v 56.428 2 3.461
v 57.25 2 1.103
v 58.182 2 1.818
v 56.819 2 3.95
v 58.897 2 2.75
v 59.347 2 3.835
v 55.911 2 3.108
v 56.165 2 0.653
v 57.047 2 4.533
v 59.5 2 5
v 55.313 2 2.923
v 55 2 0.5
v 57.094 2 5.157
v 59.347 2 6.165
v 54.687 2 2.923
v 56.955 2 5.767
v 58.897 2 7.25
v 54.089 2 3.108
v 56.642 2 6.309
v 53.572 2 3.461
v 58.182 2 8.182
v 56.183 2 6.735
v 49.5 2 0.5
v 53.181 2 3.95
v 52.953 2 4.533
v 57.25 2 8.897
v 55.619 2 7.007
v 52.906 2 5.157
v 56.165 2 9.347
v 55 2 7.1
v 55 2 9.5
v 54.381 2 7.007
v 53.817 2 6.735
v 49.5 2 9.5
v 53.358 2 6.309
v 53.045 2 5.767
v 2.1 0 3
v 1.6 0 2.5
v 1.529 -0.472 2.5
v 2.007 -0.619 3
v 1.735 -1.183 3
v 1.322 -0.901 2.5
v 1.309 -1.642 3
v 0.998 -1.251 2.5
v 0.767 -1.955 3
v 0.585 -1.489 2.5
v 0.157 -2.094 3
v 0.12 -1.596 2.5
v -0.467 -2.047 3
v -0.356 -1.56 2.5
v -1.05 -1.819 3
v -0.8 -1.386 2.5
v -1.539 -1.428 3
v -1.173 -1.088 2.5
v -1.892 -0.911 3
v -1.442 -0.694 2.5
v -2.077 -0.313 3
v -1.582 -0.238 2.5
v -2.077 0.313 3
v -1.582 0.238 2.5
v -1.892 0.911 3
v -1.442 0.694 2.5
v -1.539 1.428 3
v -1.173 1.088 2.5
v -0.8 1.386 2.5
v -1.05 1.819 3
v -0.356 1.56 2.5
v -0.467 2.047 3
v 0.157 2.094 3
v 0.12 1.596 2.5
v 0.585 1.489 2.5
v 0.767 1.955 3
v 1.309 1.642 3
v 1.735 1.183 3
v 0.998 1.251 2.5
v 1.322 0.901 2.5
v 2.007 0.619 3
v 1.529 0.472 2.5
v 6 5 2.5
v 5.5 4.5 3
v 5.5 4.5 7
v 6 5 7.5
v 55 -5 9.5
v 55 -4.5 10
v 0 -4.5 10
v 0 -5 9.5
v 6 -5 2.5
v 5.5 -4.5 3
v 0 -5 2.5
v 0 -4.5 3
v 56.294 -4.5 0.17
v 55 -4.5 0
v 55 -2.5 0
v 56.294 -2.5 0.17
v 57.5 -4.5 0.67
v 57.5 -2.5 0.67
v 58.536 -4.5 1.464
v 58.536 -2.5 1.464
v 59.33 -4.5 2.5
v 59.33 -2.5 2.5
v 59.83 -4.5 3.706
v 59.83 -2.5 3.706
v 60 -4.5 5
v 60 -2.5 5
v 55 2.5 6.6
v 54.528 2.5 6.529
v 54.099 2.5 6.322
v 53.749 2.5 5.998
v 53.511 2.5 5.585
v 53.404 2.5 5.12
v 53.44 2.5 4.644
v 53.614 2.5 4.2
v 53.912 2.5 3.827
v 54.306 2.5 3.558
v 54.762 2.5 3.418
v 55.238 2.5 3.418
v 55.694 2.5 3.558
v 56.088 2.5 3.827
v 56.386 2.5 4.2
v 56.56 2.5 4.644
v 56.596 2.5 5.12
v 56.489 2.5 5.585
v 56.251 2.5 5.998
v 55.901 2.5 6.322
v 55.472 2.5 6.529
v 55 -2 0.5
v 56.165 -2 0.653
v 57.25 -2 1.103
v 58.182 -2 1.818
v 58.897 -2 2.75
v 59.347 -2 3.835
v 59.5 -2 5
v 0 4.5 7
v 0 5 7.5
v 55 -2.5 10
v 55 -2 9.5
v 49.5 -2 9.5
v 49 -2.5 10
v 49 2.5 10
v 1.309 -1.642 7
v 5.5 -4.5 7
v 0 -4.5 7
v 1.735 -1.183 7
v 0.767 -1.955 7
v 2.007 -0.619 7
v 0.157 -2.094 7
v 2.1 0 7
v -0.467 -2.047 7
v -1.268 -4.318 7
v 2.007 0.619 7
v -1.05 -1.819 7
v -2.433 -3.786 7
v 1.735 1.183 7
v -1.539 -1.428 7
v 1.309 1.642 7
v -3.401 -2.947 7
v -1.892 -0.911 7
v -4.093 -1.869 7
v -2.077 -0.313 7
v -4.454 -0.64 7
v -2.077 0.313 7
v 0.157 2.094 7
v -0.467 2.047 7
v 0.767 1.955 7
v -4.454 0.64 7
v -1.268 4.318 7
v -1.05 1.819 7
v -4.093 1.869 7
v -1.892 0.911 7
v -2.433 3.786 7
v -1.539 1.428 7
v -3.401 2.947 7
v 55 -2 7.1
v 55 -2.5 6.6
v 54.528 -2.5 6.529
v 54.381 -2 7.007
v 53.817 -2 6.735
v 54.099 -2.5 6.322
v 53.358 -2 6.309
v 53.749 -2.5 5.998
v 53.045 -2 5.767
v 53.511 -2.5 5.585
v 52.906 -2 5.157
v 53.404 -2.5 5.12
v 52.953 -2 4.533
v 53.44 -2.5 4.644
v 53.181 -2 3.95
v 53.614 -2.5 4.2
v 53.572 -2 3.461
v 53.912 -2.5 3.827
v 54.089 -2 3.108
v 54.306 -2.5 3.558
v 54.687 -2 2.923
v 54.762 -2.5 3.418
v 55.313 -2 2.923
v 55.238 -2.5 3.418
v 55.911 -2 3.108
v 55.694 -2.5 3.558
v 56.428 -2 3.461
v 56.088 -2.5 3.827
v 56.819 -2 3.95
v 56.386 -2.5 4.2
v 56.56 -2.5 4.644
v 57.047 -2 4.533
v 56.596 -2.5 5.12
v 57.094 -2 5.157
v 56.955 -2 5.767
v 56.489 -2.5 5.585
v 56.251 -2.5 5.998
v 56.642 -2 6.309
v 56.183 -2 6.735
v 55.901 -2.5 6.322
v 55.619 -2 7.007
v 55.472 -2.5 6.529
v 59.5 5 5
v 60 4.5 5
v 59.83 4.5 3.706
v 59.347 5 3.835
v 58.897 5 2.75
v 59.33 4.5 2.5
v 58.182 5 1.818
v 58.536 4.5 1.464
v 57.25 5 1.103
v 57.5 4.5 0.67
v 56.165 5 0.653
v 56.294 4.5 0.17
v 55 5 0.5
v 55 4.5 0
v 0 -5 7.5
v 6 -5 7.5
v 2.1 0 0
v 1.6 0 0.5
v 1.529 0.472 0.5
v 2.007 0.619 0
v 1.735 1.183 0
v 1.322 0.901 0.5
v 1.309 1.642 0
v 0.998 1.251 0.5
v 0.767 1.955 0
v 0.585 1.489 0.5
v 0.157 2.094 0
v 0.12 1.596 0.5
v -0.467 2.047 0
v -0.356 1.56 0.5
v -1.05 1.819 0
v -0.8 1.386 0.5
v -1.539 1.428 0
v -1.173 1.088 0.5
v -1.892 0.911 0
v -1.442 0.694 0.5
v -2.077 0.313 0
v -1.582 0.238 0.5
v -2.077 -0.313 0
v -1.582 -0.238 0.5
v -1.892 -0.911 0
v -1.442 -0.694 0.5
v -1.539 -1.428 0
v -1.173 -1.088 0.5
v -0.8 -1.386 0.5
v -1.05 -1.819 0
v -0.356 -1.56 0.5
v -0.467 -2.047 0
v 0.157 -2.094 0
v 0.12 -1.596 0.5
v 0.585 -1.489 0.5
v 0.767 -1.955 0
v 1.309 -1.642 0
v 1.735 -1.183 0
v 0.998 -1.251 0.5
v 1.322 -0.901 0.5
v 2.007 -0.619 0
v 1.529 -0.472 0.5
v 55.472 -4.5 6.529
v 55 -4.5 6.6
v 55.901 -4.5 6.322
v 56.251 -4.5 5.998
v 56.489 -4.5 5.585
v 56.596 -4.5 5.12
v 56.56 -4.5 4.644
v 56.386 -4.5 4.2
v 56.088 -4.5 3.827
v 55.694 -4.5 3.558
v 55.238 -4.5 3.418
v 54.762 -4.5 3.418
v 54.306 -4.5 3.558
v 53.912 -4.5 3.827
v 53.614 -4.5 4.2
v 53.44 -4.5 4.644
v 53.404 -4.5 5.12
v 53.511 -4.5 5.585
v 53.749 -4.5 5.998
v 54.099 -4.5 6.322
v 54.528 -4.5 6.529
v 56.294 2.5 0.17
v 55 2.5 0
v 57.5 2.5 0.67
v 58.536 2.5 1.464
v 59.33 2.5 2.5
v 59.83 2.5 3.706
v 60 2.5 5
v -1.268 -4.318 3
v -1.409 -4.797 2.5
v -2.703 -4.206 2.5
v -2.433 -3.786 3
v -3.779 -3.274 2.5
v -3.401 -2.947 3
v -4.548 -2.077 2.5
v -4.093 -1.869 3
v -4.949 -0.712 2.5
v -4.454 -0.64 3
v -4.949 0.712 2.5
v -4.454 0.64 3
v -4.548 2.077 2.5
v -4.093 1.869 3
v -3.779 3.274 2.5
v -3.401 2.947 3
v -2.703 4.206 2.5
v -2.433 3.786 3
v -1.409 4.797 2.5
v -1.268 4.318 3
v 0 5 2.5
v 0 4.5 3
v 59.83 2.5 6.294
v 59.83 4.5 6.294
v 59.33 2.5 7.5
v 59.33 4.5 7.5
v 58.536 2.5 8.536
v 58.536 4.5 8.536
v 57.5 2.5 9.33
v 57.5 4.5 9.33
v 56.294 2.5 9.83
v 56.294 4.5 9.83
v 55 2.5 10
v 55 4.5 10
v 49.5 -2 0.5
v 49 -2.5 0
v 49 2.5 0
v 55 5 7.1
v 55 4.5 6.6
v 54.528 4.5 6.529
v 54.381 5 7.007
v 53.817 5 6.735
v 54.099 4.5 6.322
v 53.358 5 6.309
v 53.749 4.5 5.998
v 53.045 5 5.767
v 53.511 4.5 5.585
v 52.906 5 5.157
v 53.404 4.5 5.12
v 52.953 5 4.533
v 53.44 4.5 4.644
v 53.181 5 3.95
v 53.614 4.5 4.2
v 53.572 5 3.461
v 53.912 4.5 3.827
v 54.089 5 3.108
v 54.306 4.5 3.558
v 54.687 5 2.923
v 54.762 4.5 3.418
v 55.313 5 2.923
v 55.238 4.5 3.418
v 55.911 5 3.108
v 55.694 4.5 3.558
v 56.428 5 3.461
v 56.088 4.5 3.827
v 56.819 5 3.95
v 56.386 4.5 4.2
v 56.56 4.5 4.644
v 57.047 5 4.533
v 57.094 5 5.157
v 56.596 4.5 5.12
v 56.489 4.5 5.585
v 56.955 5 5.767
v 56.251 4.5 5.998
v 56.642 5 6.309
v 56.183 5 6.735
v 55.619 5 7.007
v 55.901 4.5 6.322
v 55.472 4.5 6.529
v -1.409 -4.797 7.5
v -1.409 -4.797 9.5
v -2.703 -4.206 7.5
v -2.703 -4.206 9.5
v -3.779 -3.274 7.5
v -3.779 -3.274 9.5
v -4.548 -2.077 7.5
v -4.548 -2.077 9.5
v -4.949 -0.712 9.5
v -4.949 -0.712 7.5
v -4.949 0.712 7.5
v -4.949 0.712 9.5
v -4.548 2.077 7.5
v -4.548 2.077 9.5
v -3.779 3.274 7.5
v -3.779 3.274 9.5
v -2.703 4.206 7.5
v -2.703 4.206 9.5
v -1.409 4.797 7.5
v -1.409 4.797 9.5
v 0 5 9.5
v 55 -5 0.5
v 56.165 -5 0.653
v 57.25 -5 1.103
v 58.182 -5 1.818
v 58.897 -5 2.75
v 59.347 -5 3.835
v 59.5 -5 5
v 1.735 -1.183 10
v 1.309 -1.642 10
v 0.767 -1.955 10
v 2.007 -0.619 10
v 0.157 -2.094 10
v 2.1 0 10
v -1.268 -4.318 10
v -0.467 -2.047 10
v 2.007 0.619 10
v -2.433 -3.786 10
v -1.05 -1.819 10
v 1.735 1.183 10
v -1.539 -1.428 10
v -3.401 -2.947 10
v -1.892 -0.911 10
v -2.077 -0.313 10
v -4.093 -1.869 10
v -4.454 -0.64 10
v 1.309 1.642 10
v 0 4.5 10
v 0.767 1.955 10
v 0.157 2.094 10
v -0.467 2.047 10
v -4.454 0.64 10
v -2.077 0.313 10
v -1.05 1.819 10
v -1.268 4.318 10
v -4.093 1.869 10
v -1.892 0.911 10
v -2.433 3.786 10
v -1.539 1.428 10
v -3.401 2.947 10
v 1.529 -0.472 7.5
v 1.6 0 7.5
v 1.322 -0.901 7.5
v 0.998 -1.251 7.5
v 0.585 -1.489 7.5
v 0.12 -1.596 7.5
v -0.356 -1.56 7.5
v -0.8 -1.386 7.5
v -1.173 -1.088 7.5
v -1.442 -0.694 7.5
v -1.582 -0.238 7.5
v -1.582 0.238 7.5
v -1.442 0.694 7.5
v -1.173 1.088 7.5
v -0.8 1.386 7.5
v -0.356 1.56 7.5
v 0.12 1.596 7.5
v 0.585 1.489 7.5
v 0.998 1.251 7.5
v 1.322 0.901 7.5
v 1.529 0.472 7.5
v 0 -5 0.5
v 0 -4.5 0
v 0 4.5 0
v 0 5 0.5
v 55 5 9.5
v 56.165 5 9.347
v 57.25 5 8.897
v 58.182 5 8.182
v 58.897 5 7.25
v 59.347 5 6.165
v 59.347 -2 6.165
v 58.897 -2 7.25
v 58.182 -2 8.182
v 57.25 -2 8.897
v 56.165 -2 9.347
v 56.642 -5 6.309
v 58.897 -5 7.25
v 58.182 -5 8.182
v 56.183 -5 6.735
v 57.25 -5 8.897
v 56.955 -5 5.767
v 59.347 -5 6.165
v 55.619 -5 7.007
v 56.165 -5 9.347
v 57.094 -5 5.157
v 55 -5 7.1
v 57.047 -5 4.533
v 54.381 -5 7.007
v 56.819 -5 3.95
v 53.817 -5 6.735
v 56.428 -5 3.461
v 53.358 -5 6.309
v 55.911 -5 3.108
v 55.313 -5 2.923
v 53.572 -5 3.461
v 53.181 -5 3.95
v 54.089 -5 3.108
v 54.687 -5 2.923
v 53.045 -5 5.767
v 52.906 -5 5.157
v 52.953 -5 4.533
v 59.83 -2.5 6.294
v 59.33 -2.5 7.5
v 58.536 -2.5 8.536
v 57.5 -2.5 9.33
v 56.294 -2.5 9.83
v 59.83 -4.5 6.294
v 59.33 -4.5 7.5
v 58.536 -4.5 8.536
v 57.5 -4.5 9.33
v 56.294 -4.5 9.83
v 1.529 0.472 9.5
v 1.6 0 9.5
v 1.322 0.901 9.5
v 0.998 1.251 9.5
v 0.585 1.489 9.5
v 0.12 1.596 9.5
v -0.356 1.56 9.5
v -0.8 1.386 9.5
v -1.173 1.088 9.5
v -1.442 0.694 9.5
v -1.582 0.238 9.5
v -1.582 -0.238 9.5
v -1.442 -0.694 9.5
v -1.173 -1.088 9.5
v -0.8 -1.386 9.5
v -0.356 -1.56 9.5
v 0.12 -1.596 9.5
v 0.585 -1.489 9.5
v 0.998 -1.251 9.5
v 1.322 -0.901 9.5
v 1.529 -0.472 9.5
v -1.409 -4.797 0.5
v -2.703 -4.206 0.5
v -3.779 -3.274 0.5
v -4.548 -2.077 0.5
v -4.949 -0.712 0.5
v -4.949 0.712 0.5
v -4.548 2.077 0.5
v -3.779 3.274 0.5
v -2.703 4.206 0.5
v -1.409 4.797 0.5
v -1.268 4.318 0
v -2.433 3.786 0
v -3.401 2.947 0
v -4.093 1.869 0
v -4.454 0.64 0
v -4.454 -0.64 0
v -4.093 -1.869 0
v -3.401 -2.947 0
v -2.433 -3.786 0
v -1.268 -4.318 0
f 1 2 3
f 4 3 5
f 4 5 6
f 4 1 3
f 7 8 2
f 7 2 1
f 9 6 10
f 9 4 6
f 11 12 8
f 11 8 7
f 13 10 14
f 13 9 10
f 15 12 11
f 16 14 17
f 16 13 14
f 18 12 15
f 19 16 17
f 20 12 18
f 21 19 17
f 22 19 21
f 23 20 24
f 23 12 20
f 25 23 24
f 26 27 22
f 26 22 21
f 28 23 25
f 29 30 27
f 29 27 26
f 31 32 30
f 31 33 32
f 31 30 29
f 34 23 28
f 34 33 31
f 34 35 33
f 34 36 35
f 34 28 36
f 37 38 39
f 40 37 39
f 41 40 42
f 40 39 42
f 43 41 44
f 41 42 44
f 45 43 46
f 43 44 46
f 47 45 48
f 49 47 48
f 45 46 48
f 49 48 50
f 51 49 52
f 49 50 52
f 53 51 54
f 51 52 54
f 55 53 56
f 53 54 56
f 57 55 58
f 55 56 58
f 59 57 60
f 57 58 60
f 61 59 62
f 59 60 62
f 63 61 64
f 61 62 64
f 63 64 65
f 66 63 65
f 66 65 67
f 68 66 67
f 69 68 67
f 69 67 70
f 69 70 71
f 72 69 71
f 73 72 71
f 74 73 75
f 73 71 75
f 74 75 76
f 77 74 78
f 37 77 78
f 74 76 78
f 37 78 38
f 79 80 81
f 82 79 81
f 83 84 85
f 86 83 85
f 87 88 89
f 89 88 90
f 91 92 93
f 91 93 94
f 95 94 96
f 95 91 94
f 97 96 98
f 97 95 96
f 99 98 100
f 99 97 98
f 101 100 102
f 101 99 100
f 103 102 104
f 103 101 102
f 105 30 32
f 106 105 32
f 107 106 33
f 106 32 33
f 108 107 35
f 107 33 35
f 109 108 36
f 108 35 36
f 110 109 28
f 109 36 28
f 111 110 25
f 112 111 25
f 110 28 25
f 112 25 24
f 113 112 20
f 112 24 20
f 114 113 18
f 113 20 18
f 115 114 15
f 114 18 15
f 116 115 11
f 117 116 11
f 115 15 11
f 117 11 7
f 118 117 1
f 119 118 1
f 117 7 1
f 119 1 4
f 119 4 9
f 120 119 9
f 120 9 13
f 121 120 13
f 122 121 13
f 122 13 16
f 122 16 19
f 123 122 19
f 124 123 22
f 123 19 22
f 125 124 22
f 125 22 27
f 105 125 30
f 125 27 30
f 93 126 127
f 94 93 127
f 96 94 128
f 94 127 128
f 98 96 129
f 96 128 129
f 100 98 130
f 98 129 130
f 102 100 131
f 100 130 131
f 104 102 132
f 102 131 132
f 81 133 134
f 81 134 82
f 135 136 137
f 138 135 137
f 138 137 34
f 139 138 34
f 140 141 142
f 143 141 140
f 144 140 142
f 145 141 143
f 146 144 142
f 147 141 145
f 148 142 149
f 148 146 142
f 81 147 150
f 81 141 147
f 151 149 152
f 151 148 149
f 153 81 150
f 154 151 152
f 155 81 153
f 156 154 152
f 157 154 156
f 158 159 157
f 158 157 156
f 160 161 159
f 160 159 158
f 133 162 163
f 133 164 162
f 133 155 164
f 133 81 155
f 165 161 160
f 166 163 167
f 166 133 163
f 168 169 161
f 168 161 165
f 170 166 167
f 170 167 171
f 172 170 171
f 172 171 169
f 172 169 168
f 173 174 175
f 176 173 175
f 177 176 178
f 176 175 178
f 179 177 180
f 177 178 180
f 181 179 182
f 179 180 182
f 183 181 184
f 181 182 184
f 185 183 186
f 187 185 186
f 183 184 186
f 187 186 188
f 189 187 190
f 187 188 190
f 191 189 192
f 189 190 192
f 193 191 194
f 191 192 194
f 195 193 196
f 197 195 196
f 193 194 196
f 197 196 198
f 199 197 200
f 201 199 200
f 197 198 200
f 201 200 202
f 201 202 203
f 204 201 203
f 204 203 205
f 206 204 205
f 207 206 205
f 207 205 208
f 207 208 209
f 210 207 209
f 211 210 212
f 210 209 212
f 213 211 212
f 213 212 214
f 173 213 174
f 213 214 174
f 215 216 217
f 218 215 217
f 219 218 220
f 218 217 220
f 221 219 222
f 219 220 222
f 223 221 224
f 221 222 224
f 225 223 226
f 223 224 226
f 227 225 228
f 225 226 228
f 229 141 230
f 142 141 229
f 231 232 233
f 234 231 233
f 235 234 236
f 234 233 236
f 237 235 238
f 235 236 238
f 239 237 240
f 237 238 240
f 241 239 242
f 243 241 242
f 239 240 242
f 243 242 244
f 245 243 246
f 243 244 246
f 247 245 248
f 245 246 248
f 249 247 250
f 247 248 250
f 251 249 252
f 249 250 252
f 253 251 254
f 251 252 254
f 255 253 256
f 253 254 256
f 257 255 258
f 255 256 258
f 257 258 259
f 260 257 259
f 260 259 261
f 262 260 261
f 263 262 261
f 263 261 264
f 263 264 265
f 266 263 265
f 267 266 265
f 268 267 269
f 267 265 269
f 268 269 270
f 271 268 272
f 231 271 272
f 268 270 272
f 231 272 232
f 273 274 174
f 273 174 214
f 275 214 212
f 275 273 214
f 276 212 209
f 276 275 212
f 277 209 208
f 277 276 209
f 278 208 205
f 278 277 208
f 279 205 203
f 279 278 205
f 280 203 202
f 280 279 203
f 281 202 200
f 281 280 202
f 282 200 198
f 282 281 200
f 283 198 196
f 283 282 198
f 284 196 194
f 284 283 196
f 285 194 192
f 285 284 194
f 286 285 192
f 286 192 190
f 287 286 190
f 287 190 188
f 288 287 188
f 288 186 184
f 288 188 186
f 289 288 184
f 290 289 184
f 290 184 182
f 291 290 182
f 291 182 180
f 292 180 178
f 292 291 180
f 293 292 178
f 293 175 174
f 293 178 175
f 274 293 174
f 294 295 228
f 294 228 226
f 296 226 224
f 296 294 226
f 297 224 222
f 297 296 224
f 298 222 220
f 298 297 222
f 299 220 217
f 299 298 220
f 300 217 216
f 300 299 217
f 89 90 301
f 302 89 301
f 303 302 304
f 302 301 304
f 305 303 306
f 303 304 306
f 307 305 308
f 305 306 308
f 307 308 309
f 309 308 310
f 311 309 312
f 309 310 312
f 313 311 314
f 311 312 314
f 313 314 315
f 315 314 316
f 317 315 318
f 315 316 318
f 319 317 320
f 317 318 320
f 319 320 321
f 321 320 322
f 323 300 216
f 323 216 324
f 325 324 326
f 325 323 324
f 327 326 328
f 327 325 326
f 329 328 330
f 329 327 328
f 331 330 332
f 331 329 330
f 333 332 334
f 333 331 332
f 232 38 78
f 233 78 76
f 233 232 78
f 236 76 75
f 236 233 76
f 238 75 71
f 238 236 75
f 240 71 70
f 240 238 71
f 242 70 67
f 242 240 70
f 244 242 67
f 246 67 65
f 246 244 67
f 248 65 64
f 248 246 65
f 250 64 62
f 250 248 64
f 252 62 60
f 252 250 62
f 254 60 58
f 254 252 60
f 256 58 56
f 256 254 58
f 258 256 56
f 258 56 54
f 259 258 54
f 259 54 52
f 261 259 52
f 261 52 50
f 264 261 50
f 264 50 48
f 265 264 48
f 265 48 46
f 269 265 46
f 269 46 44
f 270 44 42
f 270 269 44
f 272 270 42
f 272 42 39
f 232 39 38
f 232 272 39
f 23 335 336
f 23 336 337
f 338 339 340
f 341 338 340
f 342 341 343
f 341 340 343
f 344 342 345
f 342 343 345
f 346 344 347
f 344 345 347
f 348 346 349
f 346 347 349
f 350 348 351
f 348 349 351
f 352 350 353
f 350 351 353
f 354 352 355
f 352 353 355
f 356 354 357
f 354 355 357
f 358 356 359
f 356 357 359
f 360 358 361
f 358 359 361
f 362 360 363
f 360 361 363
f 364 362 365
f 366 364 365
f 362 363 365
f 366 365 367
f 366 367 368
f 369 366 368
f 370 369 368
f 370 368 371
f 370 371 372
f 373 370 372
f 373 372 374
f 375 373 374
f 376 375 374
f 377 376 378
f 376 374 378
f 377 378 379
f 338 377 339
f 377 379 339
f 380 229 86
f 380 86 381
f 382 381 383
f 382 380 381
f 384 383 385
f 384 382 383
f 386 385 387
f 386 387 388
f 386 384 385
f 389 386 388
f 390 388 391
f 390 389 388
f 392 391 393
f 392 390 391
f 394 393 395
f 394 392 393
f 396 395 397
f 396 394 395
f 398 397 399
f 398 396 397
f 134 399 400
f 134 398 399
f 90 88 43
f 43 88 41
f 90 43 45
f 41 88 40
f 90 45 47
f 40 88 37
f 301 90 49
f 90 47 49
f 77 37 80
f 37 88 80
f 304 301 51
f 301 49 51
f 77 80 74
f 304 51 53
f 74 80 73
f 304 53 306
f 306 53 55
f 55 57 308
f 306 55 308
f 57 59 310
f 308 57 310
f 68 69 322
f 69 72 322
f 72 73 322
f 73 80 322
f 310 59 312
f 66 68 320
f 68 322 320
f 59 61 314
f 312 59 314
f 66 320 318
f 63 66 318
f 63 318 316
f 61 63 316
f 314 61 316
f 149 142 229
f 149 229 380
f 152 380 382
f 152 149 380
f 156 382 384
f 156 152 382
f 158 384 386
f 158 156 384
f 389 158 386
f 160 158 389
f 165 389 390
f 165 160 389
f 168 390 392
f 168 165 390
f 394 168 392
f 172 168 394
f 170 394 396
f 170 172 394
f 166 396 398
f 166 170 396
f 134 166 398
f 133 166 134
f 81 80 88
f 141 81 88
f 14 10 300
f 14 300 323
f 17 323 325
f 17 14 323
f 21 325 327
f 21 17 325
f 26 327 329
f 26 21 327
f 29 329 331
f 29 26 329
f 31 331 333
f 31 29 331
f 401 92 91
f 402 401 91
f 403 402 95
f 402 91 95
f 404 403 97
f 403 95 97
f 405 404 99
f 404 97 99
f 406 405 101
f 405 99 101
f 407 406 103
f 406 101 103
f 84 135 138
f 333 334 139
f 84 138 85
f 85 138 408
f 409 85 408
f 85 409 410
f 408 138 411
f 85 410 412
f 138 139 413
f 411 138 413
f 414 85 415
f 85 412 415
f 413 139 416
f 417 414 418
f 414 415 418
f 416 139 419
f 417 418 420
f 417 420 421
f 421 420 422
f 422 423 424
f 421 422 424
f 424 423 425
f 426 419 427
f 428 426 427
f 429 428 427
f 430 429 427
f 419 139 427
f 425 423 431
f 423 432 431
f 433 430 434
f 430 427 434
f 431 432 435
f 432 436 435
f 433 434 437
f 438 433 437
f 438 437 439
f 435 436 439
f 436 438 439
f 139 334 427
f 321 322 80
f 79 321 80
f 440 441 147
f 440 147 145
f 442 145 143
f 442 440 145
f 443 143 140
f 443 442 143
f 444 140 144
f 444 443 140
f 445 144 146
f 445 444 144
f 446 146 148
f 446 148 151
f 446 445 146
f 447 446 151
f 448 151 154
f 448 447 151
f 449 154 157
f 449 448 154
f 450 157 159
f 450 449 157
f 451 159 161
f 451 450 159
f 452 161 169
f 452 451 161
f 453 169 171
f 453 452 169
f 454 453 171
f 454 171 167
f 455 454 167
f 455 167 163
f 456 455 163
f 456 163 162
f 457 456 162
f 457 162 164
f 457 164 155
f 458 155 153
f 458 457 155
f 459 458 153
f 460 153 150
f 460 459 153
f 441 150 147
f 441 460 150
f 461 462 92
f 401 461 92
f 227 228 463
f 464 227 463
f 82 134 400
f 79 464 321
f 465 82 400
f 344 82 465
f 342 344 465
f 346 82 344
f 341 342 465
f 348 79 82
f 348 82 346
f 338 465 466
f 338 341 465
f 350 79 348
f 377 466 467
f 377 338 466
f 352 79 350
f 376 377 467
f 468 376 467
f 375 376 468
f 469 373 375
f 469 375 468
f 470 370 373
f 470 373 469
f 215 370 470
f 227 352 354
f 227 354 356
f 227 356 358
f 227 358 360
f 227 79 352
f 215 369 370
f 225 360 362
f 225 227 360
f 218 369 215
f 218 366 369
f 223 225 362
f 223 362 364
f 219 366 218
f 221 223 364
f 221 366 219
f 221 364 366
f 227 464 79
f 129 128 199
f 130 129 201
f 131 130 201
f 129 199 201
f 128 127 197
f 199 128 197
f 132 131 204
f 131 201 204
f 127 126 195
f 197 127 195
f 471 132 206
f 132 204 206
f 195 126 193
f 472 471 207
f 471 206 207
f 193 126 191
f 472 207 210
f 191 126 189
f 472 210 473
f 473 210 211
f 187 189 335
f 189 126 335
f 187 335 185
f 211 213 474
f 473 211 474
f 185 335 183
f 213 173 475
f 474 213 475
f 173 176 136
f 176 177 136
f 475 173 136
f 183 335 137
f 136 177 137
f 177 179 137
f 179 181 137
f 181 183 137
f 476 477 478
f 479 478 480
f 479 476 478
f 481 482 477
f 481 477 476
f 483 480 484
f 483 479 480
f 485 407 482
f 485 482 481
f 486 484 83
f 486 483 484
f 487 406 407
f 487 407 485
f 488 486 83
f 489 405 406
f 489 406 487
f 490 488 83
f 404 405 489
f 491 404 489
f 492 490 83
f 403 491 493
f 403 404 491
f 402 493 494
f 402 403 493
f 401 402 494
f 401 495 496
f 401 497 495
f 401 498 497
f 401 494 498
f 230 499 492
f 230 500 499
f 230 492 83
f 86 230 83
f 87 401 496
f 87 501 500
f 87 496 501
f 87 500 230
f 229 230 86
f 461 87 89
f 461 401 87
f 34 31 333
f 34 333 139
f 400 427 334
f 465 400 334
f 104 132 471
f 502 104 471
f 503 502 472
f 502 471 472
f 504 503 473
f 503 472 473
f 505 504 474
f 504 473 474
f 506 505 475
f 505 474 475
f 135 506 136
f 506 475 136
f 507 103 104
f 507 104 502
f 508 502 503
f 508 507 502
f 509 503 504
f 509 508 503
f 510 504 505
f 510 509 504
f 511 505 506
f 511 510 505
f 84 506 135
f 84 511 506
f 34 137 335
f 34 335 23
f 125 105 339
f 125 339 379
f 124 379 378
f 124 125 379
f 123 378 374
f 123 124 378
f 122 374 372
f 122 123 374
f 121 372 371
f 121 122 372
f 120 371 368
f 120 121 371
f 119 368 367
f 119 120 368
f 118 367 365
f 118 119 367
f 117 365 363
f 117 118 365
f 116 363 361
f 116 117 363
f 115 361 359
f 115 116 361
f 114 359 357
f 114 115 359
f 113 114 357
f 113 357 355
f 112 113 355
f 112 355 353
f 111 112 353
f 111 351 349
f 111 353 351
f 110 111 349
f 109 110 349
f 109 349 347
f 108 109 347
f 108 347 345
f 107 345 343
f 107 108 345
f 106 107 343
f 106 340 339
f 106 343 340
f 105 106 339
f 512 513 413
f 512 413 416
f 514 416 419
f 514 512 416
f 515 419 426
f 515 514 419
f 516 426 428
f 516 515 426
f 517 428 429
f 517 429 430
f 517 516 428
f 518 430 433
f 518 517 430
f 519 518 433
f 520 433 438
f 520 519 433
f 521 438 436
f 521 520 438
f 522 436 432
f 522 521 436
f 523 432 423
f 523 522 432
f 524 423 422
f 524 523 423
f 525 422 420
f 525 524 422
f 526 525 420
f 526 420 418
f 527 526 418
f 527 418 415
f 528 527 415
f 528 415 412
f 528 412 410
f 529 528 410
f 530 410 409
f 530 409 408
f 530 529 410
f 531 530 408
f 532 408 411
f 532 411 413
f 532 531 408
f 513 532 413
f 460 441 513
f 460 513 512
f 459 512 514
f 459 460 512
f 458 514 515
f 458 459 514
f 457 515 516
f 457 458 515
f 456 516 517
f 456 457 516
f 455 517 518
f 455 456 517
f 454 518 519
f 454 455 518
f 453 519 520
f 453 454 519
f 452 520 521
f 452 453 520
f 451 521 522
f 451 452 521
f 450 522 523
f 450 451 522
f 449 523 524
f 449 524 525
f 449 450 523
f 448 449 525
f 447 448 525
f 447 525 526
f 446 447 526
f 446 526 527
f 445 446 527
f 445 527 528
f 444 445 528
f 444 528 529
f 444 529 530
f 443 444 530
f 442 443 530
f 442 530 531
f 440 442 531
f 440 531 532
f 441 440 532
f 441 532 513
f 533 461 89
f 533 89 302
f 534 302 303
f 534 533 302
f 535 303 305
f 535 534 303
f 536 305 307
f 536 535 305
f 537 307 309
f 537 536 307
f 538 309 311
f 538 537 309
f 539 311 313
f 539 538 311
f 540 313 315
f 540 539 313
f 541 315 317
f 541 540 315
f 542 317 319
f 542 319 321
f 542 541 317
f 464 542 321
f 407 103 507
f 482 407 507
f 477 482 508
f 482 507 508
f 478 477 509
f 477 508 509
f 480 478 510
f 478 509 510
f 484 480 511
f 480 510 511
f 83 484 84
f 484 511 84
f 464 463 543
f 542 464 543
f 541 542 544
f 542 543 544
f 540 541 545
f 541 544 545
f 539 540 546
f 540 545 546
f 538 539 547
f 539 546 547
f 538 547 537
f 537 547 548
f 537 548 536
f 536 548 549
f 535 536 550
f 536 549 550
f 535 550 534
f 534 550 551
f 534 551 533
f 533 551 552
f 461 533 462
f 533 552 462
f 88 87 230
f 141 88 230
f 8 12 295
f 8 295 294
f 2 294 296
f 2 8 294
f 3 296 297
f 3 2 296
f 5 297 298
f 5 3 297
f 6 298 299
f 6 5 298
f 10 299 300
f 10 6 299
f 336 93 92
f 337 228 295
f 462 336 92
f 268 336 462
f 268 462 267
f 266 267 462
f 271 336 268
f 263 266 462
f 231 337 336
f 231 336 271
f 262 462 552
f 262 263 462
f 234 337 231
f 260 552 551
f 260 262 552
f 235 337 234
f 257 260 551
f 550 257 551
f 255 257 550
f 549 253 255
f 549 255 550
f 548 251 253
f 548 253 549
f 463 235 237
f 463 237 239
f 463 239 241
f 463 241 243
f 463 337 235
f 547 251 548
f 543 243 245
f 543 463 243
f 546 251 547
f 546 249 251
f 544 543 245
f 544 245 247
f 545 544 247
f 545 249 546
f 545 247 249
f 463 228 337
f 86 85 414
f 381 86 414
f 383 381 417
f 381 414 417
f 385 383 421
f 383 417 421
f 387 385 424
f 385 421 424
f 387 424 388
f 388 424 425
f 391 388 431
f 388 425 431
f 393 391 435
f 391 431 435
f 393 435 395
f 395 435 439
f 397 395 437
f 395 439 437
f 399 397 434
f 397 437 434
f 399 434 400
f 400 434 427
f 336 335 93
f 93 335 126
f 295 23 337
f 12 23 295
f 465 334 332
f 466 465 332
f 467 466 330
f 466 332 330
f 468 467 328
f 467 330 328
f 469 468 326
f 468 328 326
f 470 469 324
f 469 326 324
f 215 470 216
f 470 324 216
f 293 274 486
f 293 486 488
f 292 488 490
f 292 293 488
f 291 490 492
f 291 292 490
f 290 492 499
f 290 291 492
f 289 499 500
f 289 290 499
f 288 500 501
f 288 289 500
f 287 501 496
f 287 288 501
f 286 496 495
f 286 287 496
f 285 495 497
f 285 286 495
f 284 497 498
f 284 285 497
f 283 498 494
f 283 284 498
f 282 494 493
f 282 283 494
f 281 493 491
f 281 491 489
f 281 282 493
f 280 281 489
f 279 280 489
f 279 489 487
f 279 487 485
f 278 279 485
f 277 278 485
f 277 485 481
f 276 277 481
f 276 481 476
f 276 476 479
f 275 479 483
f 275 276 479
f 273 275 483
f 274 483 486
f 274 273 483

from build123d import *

# Parameters (mm, degrees)
SKETCH1_R               = 1.6
BOSS_EXTRUDE1_DEPTH     = 10
CUT_EXTRUDE1_START      = -7
CUT_EXTRUDE1_DEPTH      = 4
FILLET1_R               = 5
CUT_EXTRUDE2_START      = 49.5
CUT_EXTRUDE2_OUTLINE_W  = 4
CUT_EXTRUDE2_OUTLINE_H  = 10
CUT_EXTRUDE2_DEPTH      = 10.5
CUT_EXTRUDE3_DEPTH      = 62.64414003
CUT_EXTRUDE3_DEPTH_BACK = 62.64414003
SKETCH5_R               = 1.6
CHAMFER1_SIZE           = 0.5


# Read off the part's stored shape, not the designer's step: Cut-Extrude2
with BuildPart() as part:
    # Sketch1 → Boss-Extrude1 (new body)
    with BuildSketch(Plane.XY):
        with BuildLine():
            Line((0, 5), (60, 5))
            Line((60, 5), (60, -5))
            Line((60, -5), (0, -5))
            ThreePointArc((0, -5), (-5, 0), (0, 5))
        make_face()
        Circle(SKETCH1_R, mode=Mode.SUBTRACT)
    extrude(amount=BOSS_EXTRUDE1_DEPTH)

    # Sketch2 → Cut-Extrude1 (cut)
    with BuildSketch(Plane.XY.offset(10).offset(CUT_EXTRUDE1_START)):
        with BuildLine():
            Line((5.5, 5), (5.5, -5))
            Line((5.5, -5), (0, -5))
            ThreePointArc((0, -5), (-5, 0), (0, 5))
            Line((0, 5), (5.5, 5))
        make_face()
    extrude(amount=CUT_EXTRUDE1_DEPTH, mode=Mode.SUBTRACT)

    # Fillet1
    fillet1_edges = [part.edges().sort_by_distance(p)[0] for p in [
        (60, 0, 0),
        (60, 0, 10),
    ]]
    fillet(fillet1_edges, radius=FILLET1_R - 0.0001)  # a hair under: the kernel refuses the full size

    # Cut-Extrude2 outline → Cut-Extrude2 (cut)
    with BuildSketch(Plane.YZ.offset(CUT_EXTRUDE2_START)):
        with Locations((0, 5)):
            Rectangle(CUT_EXTRUDE2_OUTLINE_W, CUT_EXTRUDE2_OUTLINE_H)
    extrude(amount=CUT_EXTRUDE2_DEPTH, mode=Mode.SUBTRACT)

    # Sketch5 → Cut-Extrude3 (cut, two sides: drawn at the far end of the back side and taken through both)
    with BuildSketch(Plane(origin=(0, 5, 0), x_dir=(1, 0, 0), z_dir=(0, 1, 0)).offset(-CUT_EXTRUDE3_DEPTH_BACK)):
        with Locations(Location((55, -5, 0), (0, 0, 270))):
            Circle(SKETCH5_R)
    extrude(amount=CUT_EXTRUDE3_DEPTH + CUT_EXTRUDE3_DEPTH_BACK, mode=Mode.SUBTRACT)

    # Chamfer1
    chamfer1_edges = [part.edges().sort_by_distance(p)[0] for p in [
        (-1.6, 0, 0),
        (-1.6, 0, 10),
        (-1.6, 0, 3),
        (2.75, 5, 3),
        (5.5, 5, 5),
        (2.75, -5, 3),
        (5.5, -5, 5),
        (-5, 0, 3),
        (-1.6, 0, 7),
        (2.75, 5, 7),
        (-5, 0, 7),
        (2.75, -5, 7),
        (27.50005, 5, 10),
        (27.50005, 5, 0),
        (58.535563195, 5, 8.535563195),
        (58.535563195, 5, 1.464436805),
        (58.535563195, -5, 8.535563195),
        (58.535563195, -5, 1.464436805),
        (-5, 0, 10),
        (58.535563195, 2, 1.464436805),
        (58.535563195, -2, 1.464436805),
        (58.535563195, -2, 8.535563195),
        (27.50005, -5, 0),
        (52.25005, -2, 10),
        (49.5, 0, 10),
        (52.25005, -2, 0),
        (49.5, 0, 0),
        (58.535563195, 2, 8.535563195),
        (52.25005, 2, 0),
        (52.25005, 2, 10),
        (-5, 0, 0),
        (55, 2, 3.4),
        (55, 5, 3.4),
        (55, -2, 3.4),
        (55, -5, 3.4),
        (27.50005, -5, 10),
    ]]
    chamfer(chamfer1_edges, length=CHAMFER1_SIZE)


solid = part.part
